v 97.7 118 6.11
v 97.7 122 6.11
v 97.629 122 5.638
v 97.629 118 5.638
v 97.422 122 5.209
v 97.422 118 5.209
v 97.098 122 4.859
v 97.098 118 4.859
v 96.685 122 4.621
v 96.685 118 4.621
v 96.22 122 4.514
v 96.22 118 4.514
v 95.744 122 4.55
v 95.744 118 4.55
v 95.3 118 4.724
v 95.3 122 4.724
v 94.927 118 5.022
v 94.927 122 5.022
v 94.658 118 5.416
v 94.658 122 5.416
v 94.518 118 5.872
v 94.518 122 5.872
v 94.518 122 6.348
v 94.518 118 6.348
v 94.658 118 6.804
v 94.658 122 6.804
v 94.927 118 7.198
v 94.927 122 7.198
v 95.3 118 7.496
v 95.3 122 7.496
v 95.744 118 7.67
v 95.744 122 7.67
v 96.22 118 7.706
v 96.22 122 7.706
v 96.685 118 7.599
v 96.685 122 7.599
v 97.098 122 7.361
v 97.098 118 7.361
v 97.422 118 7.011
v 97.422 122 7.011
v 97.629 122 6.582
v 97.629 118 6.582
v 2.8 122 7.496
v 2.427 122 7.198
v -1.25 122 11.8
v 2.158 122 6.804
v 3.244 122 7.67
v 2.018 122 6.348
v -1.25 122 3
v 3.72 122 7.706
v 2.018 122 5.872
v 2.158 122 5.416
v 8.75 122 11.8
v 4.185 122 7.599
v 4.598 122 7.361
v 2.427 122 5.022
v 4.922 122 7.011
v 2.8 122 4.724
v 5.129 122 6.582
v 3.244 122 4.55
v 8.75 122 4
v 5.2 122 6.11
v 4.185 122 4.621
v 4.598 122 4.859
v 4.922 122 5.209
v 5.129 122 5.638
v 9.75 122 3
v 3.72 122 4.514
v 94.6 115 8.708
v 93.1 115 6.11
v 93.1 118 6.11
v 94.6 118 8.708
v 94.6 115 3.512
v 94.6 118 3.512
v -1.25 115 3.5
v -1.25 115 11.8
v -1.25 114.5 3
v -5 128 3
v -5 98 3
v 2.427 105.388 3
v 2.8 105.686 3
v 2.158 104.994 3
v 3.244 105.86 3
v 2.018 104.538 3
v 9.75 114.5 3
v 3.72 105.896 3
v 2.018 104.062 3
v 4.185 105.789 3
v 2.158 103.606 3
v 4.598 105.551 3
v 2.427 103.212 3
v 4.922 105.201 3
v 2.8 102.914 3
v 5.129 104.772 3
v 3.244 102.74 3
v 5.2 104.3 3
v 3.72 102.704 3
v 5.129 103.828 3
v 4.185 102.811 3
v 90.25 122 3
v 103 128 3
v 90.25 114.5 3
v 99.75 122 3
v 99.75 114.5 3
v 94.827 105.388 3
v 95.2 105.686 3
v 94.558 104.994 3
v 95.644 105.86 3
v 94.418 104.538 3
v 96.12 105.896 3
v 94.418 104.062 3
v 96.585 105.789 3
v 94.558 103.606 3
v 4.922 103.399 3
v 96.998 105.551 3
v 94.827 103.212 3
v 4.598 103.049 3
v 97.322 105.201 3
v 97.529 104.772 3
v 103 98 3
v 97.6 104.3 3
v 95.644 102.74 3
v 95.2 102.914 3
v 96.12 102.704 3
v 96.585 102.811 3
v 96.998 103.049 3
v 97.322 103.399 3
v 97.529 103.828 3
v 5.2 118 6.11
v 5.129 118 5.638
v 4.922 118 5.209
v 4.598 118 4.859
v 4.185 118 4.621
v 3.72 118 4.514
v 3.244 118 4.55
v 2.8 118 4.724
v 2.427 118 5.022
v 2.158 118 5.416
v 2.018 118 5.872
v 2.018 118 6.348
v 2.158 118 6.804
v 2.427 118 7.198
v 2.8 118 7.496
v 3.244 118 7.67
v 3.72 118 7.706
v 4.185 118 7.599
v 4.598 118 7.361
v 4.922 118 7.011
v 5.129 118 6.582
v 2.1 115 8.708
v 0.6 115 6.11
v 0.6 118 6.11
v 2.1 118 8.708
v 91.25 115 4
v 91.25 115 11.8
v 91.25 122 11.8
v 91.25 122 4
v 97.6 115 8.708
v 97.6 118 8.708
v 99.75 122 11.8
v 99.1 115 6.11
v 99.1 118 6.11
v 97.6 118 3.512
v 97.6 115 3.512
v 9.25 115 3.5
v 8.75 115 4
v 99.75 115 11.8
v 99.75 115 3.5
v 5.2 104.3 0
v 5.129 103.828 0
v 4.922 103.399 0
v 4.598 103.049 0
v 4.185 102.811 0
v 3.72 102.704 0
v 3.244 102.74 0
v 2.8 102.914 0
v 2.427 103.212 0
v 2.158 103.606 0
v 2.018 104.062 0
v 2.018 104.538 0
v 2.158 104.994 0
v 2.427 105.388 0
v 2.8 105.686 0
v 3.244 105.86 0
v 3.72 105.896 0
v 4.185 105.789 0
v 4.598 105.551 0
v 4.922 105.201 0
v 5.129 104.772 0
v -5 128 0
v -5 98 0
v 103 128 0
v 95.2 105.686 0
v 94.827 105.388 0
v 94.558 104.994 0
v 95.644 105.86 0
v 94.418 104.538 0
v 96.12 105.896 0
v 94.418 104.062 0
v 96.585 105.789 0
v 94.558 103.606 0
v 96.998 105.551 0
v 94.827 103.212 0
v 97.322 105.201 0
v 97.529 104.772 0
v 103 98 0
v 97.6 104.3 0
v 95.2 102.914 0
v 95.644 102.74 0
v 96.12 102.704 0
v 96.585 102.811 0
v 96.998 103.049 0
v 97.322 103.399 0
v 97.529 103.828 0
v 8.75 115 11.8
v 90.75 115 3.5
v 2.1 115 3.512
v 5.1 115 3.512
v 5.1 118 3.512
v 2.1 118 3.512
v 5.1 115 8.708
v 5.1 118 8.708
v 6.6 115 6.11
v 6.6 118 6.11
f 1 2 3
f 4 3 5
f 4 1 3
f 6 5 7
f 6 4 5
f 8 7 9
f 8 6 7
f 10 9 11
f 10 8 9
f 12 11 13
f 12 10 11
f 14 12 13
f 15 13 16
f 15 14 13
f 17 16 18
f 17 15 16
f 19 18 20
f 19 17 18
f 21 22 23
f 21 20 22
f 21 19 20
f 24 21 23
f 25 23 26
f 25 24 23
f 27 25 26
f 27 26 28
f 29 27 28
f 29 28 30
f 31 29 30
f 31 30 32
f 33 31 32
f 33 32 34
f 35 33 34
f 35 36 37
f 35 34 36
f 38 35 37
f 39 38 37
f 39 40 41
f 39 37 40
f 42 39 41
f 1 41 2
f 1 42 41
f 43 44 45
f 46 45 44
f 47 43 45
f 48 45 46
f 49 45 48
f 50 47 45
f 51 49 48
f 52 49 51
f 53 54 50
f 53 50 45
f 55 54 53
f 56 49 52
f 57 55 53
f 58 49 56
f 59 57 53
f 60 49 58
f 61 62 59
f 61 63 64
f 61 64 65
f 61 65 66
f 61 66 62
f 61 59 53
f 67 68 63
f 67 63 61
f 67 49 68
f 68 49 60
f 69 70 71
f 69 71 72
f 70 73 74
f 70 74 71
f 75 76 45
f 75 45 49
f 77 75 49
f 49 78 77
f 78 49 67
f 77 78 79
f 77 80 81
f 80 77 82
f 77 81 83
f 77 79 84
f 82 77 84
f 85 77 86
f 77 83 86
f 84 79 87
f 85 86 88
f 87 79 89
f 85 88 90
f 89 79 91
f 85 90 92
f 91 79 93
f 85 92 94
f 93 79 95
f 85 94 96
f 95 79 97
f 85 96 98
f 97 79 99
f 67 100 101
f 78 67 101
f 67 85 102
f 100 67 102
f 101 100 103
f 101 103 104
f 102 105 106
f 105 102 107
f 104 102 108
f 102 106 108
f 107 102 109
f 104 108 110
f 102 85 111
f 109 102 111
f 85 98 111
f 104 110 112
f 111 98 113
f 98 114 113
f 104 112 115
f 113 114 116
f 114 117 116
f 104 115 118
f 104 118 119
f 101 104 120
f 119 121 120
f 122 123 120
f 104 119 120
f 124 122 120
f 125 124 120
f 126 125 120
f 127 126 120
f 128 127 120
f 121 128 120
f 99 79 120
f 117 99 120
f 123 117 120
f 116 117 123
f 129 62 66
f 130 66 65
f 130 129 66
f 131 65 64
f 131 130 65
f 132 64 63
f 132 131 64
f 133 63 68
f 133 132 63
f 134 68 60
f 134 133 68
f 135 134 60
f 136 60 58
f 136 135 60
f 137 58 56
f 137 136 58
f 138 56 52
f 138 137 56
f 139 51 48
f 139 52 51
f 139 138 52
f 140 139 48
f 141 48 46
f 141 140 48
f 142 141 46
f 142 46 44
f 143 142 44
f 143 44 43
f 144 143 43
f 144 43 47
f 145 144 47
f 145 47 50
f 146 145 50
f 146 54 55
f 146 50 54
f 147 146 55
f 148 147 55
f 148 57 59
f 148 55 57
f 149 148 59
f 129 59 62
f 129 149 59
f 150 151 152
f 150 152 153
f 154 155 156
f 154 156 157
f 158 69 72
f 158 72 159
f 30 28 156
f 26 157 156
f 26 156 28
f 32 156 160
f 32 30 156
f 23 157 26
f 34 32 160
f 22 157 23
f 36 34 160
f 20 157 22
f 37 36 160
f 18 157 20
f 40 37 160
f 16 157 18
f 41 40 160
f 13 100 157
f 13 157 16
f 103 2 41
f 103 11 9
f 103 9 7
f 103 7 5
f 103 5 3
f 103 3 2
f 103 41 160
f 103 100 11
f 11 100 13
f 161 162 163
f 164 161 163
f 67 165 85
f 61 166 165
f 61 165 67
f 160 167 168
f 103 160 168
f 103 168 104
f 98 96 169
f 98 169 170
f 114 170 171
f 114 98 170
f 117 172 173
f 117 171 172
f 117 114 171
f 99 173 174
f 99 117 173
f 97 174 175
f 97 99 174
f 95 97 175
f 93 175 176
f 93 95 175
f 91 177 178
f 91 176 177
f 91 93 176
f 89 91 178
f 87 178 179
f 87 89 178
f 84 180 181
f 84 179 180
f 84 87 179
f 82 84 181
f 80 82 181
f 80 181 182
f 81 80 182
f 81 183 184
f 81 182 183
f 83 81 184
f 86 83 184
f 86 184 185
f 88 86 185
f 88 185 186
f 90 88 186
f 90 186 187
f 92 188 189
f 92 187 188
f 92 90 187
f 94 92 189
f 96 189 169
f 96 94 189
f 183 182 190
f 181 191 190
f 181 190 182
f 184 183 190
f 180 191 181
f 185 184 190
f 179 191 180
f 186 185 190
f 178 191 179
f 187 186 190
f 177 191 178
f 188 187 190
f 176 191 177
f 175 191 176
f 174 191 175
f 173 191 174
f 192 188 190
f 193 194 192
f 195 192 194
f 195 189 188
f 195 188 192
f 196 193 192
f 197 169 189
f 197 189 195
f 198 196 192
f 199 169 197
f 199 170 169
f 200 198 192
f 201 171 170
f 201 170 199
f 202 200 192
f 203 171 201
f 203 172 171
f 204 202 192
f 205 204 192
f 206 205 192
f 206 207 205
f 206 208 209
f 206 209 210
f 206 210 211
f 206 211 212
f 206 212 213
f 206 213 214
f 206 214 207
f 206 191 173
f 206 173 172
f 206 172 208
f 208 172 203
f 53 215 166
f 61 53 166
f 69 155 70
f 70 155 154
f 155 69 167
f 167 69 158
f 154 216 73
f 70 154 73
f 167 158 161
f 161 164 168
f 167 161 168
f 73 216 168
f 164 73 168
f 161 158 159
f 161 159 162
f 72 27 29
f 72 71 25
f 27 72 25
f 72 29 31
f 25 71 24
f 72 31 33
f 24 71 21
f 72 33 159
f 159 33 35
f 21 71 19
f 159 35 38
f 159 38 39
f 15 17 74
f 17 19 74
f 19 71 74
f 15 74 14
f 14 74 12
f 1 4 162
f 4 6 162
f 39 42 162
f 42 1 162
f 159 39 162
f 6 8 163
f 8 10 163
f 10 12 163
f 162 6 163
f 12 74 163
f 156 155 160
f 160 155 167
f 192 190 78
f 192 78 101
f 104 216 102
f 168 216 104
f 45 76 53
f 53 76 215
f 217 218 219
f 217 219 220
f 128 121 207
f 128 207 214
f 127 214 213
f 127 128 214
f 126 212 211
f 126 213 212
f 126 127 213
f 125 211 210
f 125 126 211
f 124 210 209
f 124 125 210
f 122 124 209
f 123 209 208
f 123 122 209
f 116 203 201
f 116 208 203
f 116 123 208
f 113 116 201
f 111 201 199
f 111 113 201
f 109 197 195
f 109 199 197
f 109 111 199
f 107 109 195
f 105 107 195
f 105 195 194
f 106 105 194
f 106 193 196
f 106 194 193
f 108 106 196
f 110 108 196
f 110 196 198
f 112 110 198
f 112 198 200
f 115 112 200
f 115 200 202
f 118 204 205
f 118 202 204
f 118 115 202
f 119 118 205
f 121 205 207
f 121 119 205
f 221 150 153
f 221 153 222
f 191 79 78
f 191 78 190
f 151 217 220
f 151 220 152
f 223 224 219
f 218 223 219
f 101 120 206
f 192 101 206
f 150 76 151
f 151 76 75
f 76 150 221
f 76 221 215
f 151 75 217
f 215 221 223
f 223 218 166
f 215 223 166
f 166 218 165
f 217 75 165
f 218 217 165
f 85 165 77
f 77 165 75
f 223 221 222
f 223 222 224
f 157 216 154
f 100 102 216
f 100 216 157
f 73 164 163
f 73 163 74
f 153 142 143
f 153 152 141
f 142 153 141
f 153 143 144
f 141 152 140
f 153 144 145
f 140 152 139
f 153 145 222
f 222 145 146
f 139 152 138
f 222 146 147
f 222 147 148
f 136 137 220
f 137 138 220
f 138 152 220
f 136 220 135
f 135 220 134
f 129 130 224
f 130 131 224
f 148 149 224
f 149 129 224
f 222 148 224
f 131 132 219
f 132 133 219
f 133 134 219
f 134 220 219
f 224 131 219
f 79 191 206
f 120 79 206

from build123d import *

# Parameters (mm, degrees)
CYLINDER019_R          = 1.6
CYLINDER019_DEPTH      = 10
PRISM002_DEPTH         = 3
BOX022_W               = 10
BOX022_H               = 11
BOX022_DEPTH           = 7
CYLINDER020_R          = 1.6
CYLINDER020_DEPTH      = 10
PRISM003_DEPTH         = 3
BOX023_W               = 8.5
BOX023_H               = 11
BOX023_DEPTH           = 7
CYLINDER017_R          = 1.6
CYLINDER017_DEPTH      = 10
CYLINDER017_ROLL_ANGLE = -90
CYLINDER015_R          = 1.6
CYLINDER015_DEPTH      = 10
CYLINDER015_ROLL_ANGLE = -90
BOX005_W               = 108
BOX005_H               = 3
BOX005_DEPTH           = 30
CHAMFER001_SIZE        = 1
CHAMFER002_SIZE        = 0.5
CHAMFER003_SIZE        = 0.5
CHAMFER003_ROLL_ANGLE  = -90


with BuildPart() as cylinder019:
    # Cylinder019 → Cylinder019 (new body)
    with BuildSketch(Plane(origin=(3.6, 5.69, -5), x_dir=(1, 0, 0), z_dir=(0, 0, 1))):
        Circle(CYLINDER019_R)
    extrude(amount=CYLINDER019_DEPTH)


with BuildPart() as prism002:
    # Prism002 → Prism002 (new body)
    with BuildSketch(Plane(origin=(3.6, 5.69, -7), x_dir=(1, 0, 0), z_dir=(0, 0, 1))):
        Polygon((3, 0), (1.5, 2.598076), (-1.5, 2.598076), (-3, 0), (-1.5, -2.598076), (1.5, -2.598076), align=None)
    extrude(amount=PRISM002_DEPTH)


with BuildPart() as cut010:
    # Box022 → Box022 (new body)
    with BuildSketch(Plane(origin=(-1.25, 0, -7), x_dir=(1, 0, 0), z_dir=(0, 0, 1))):
        with Locations((5, 5.5)):
            Rectangle(BOX022_W, BOX022_H)
    extrude(amount=BOX022_DEPTH)

    # Cut009: cut Prism002
    add(prism002.part, mode=Mode.SUBTRACT)


with BuildPart() as cut010_1:
    # Cut009 placement: moved
    add(cut010.part.moved(Location((0, 0, -1))))

    # Cut010: cut Cylinder019
    add(cylinder019.part, mode=Mode.SUBTRACT)


with BuildPart() as cut010_2:
    # Cut010 placement: moved
    add(cut010_1.part.moved(Location((0, 76.2, 0))))


with BuildPart() as cylinder020:
    # Cylinder020 → Cylinder020 (new body)
    with BuildSketch(Plane(origin=(3.6, 5.69, -5), x_dir=(1, 0, 0), z_dir=(0, 0, 1))):
        Circle(CYLINDER020_R)
    extrude(amount=CYLINDER020_DEPTH)


with BuildPart() as prism003:
    # Prism003 → Prism003 (new body)
    with BuildSketch(Plane(origin=(3.6, 5.69, -7), x_dir=(1, 0, 0), z_dir=(0, 0, 1))):
        Polygon((3, 0), (1.5, 2.598076), (-1.5, 2.598076), (-3, 0), (-1.5, -2.598076), (1.5, -2.598076), align=None)
    extrude(amount=PRISM003_DEPTH)


with BuildPart() as cut012:
    # Box023 → Box023 (new body)
    with BuildSketch(Plane(origin=(-1.25, 0, -7), x_dir=(1, 0, 0), z_dir=(0, 0, 1))):
        with Locations((4.25, 5.5)):
            Rectangle(BOX023_W, BOX023_H)
    extrude(amount=BOX023_DEPTH)

    # Cut011: cut Prism003
    add(prism003.part, mode=Mode.SUBTRACT)


with BuildPart() as cut012_1:
    # Cut011 placement: moved
    add(cut012.part.moved(Location((0, 0, -1))))

    # Cut012: cut Cylinder020
    add(cylinder020.part, mode=Mode.SUBTRACT)


with BuildPart() as cut012_2:
    # Cut012 placement: moved
    add(cut012_1.part.moved(Location((92.5, 76.2, 0))))


with BuildPart() as cylinder017:
    # Cylinder017 → Cylinder017 (new body)
    with BuildSketch(Plane.XY):
        Circle(CYLINDER017_R)
    extrude(amount=CYLINDER017_DEPTH)


with BuildPart() as cylinder017_1:
    # Cylinder017 roll: moved
    add(cylinder017.part.rotate(Axis((0, 0, 0), (1, 0, 0)), CYLINDER017_ROLL_ANGLE))


with BuildPart() as cylinder017_2:
    # Cylinder017 placement: moved
    add(cylinder017_1.part.moved(Location((96, 82, -18.7))))


with BuildPart() as left_holes:
    # Cylinder015 → Cylinder015 (new body)
    with BuildSketch(Plane.XY):
        Circle(CYLINDER015_R)
    extrude(amount=CYLINDER015_DEPTH)


with BuildPart() as left_holes_1:
    # Cylinder015 roll: moved
    add(left_holes.part.rotate(Axis((0, 0, 0), (1, 0, 0)), CYLINDER015_ROLL_ANGLE))


with BuildPart() as left_holes_2:
    # Cylinder015 placement: moved
    add(left_holes_1.part.moved(Location((3.6, 82, -18.7))))

    # Fusion006: union Cylinder017
    add(cylinder017_2.part)


with BuildPart() as left_side001:
    # Box005 → Box005 (new body)
    with BuildSketch(Plane(origin=(-5, 85, -25), x_dir=(1, 0, 0), z_dir=(0, 0, 1))):
        with Locations((54, 1.5)):
            Rectangle(BOX005_W, BOX005_H)
    extrude(amount=BOX005_DEPTH)

    # Cut026: cut left holes
    add(left_holes_2.part, mode=Mode.SUBTRACT)

    # Fusion012: union Cut010, Cut012
    add(cut010_2.part)
    add(cut012_2.part)

    # Chamfer001
    chamfer001_edges = [left_side001.edges().sort_by_distance(p)[0] for p in [
        (91.25, 85, -4.5),
        (8.75, 85, -4.5),
    ]]
    chamfer(chamfer001_edges, length=CHAMFER001_SIZE)

    # Chamfer002
    chamfer002_edges = [left_side001.edges().sort_by_distance(p)[0] for p in [
        (95.5, 85, -8),
    ]]
    chamfer(chamfer002_edges, length=CHAMFER002_SIZE)

    # Chamfer003
    chamfer003_edges = [left_side001.edges().sort_by_distance(p)[0] for p in [
        (3.75, 85, -8),
    ]]
    chamfer(chamfer003_edges, length=CHAMFER003_SIZE)


with BuildPart() as left_side001_1:
    # Chamfer003 roll: moved
    add(left_side001.part.rotate(Axis((0, 0, 0), (1, 0, 0)), CHAMFER003_ROLL_ANGLE))


with BuildPart() as left_side001_2:
    # Chamfer003 placement: moved
    add(left_side001_1.part.moved(Location((0, 123, 88))))


solid = left_side001_2.part
